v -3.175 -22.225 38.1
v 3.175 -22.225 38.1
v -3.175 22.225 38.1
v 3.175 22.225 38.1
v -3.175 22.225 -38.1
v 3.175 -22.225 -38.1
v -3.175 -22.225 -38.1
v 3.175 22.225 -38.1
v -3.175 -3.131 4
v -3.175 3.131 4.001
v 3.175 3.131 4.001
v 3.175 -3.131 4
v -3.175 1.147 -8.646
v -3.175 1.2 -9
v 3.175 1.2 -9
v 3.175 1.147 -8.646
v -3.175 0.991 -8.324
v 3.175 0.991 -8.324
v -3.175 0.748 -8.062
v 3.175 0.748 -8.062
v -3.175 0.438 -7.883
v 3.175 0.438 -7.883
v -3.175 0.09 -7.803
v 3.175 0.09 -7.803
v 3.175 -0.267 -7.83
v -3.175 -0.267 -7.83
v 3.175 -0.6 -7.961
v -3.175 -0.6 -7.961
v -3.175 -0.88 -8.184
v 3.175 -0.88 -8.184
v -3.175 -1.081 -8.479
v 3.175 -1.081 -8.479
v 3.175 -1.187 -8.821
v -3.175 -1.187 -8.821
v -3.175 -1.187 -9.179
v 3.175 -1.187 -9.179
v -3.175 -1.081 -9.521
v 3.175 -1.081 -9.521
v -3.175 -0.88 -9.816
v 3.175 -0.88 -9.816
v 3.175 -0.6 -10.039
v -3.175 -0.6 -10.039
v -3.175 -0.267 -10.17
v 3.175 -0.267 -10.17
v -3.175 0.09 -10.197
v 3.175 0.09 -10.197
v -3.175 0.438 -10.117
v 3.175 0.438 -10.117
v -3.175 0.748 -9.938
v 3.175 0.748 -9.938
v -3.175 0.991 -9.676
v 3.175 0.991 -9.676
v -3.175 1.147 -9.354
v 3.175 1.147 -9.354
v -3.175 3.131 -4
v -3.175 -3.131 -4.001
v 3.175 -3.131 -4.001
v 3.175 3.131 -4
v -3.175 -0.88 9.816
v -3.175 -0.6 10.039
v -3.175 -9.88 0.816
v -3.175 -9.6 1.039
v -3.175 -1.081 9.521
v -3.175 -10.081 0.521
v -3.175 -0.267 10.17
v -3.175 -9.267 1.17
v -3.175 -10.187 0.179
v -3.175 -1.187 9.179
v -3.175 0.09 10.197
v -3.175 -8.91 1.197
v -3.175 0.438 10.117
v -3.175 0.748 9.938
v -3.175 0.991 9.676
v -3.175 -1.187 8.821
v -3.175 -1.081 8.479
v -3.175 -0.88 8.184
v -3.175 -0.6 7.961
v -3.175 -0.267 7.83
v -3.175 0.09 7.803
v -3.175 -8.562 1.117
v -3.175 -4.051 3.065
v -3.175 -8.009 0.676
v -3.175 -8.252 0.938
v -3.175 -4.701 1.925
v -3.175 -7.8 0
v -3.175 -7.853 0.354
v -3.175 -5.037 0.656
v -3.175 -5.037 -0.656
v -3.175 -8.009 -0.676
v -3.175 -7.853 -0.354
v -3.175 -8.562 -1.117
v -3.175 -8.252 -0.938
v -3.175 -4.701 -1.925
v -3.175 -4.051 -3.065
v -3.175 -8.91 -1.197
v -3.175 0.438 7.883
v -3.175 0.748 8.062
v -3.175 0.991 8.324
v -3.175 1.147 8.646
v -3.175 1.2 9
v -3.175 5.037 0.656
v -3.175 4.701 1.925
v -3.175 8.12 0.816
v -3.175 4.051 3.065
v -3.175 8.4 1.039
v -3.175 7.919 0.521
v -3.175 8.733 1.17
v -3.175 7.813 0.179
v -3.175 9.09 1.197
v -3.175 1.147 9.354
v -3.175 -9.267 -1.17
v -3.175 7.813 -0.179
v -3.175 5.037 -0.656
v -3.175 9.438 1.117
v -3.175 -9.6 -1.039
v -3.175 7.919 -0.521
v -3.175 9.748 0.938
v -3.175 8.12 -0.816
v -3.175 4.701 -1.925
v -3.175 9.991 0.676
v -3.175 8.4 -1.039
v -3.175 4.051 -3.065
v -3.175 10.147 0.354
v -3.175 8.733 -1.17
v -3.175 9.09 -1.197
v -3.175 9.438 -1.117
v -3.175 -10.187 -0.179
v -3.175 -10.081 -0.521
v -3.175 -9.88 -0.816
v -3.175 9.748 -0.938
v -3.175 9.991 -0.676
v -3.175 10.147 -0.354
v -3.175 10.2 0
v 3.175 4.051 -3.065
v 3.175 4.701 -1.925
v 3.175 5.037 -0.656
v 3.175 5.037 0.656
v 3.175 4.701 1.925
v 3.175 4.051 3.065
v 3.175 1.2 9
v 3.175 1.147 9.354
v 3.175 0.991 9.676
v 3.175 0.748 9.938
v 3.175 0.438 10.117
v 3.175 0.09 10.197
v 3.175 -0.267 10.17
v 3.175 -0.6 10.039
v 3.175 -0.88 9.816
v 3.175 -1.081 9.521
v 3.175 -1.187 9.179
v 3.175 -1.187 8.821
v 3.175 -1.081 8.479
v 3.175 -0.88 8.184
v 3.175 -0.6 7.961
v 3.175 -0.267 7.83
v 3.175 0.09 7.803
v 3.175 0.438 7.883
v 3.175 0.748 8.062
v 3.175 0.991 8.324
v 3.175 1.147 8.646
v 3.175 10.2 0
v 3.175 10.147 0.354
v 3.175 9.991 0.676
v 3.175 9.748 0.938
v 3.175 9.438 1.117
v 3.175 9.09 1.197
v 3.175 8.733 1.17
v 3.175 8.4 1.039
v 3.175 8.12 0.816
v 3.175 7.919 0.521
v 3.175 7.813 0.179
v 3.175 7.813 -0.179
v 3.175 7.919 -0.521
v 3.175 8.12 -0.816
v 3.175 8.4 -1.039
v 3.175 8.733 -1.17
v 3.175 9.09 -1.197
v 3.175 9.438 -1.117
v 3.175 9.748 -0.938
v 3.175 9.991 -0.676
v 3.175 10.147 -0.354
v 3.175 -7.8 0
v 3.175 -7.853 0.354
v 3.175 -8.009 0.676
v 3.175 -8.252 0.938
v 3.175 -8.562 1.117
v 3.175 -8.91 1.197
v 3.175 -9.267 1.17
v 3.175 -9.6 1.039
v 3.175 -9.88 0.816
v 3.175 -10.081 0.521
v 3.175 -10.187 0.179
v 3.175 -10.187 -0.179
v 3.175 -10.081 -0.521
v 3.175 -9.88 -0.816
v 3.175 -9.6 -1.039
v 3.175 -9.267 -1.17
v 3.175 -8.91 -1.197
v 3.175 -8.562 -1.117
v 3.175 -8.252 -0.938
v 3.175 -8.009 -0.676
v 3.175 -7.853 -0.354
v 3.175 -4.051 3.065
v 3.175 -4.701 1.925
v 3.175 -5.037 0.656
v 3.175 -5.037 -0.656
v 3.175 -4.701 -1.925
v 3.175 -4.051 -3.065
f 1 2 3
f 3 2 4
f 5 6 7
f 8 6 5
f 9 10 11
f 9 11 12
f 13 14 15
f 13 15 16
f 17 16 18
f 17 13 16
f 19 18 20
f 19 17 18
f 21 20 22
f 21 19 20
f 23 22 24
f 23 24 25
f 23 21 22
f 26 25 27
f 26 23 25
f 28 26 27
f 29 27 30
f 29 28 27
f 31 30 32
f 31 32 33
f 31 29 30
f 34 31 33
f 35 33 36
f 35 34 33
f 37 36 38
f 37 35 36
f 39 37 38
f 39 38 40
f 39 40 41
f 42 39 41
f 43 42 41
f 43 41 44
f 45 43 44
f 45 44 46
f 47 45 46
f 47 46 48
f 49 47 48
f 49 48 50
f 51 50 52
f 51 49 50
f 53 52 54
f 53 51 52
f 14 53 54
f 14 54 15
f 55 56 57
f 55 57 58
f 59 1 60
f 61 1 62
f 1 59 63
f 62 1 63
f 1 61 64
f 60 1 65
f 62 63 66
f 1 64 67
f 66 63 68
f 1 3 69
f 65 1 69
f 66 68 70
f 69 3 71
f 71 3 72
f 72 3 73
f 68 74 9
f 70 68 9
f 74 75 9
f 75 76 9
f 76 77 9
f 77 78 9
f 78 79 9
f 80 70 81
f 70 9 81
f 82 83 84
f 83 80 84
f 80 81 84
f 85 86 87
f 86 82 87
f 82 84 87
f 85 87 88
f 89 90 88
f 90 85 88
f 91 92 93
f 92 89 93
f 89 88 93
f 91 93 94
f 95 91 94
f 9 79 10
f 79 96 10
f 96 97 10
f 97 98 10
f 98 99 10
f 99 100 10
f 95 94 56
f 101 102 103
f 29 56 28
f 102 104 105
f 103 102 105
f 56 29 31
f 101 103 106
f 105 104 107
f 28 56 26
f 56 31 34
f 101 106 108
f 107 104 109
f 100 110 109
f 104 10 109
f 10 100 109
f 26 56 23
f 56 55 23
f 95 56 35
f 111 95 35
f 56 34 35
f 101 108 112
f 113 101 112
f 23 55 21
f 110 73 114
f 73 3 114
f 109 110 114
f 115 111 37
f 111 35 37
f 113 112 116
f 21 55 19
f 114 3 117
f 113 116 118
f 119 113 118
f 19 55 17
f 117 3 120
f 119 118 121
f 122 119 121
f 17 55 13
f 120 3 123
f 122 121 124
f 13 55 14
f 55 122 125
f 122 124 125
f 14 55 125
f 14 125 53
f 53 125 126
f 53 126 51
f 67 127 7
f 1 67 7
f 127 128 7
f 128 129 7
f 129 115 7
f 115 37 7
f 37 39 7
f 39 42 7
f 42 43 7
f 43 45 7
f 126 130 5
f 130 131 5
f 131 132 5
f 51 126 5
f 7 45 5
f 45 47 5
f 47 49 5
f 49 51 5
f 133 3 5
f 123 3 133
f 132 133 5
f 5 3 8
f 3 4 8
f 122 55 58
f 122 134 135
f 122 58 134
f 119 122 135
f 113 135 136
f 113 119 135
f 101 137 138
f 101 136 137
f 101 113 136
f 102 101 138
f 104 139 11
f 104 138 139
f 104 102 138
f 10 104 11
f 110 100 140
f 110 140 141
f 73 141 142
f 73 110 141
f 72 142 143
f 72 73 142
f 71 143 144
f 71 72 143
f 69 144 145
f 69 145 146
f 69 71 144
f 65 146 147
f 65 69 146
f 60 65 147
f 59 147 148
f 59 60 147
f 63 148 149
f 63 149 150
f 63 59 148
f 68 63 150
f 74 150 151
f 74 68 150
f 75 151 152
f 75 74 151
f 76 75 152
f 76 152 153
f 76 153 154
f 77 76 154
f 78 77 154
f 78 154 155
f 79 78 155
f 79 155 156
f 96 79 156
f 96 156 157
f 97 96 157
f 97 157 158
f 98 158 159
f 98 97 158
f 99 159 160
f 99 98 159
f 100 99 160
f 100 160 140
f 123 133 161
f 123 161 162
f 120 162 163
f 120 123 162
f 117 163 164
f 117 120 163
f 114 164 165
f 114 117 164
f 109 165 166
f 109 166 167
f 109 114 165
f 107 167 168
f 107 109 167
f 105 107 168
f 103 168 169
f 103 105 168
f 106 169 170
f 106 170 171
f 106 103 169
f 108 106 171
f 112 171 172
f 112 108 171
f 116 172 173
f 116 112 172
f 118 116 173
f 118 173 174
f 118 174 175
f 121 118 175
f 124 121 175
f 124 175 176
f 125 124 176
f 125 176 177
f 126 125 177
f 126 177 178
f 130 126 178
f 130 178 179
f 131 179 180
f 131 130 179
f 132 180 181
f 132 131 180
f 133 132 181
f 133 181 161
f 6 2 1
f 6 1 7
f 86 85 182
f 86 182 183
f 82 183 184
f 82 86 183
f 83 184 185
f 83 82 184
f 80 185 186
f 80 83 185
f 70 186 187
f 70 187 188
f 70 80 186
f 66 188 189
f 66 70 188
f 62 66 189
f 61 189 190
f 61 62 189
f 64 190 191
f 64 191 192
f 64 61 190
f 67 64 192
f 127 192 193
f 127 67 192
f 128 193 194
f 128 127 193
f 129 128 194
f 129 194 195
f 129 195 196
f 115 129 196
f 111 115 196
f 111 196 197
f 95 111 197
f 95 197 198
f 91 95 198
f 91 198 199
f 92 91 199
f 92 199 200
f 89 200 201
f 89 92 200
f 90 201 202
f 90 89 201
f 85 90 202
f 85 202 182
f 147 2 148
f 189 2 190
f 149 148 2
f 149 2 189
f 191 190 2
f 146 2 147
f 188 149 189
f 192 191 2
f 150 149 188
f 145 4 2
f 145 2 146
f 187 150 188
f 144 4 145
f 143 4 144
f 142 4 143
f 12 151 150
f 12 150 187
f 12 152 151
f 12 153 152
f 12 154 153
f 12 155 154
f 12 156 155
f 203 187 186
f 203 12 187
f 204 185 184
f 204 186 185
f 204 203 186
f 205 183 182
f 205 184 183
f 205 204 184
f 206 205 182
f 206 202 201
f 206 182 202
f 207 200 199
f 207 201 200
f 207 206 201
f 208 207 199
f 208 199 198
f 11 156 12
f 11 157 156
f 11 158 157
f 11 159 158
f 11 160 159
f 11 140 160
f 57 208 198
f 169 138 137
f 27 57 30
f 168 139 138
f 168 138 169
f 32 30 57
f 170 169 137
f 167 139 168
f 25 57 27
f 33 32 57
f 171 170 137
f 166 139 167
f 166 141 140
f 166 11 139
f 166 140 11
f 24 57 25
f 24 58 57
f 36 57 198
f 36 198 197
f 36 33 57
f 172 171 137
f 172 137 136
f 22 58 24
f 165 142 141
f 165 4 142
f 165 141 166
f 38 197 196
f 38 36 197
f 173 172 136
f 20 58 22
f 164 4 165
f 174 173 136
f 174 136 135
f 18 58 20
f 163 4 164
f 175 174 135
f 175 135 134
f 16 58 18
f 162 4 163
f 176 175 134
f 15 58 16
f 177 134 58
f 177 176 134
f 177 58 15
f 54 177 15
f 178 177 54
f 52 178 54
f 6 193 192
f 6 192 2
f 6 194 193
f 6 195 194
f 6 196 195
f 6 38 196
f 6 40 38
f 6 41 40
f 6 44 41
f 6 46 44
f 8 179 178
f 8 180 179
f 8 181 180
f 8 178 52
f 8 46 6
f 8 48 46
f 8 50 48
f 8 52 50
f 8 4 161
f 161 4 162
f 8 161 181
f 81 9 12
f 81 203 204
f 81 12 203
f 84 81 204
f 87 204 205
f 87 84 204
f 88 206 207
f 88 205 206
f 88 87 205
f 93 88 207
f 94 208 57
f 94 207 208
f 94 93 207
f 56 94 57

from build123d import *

# Parameters (mm, degrees)
SKETCH1_W               = 76.2
SKETCH1_H               = 44.45
BOSS_EXTRUDE1_DEPTH     = 3.175
CUT_EXTRUDE1_DEPTH      = 45.563248591
CUT_EXTRUDE1_DEPTH_BACK = 45.563248591
ADVANCEDHOLE1_START     = -3.175
ADVANCEDHOLE1_OUTLINE_R = 1.2
ADVANCEDHOLE1_DEPTH     = 6.35


# Read off the part's stored shape, not the designer's step: AdvancedHole1
with BuildPart() as part:
    # Sketch1 → Boss-Extrude1 (new, symmetric)
    with BuildSketch(Plane(origin=(0, 0, 0), x_dir=(0, 0, -1), z_dir=(1, 0, 0))):
        Rectangle(SKETCH1_W, SKETCH1_H)
    extrude(amount=BOSS_EXTRUDE1_DEPTH, both=True)

    # Sketch2 → Cut-Extrude1 (cut, two sides: drawn at the far end of the back side and taken through both)
    with BuildSketch(Plane(origin=(3.175, 0, 0), x_dir=(0, 0, -1), z_dir=(1, 0, 0)).offset(-CUT_EXTRUDE1_DEPTH_BACK)):
        with BuildLine():
            ThreePointArc((4.0005, 3.130878431), (0, 5.08), (-4.0005, 3.130878431))
            Line((-4.0005, 3.130878431), (-4.0005, -3.130878431))
            ThreePointArc((-4.0005, -3.130878431), (0, -5.08), (4.0005, -3.130878431))
            Line((4.0005, -3.130878431), (4.0005, 3.130878431))
        make_face()
    extrude(amount=CUT_EXTRUDE1_DEPTH + CUT_EXTRUDE1_DEPTH_BACK, mode=Mode.SUBTRACT)

    # AdvancedHole1 outline → AdvancedHole1 (cut)
    with BuildSketch(Plane.YZ.offset(ADVANCEDHOLE1_START)):
        with Locations((-9, 0)):
            Circle(ADVANCEDHOLE1_OUTLINE_R)
        with Locations((0, 9)):
            Circle(ADVANCEDHOLE1_OUTLINE_R)
        with Locations((9, 0)):
            Circle(ADVANCEDHOLE1_OUTLINE_R)
        with Locations((0, -9)):
            Circle(ADVANCEDHOLE1_OUTLINE_R)
    extrude(amount=ADVANCEDHOLE1_DEPTH, mode=Mode.SUBTRACT)


solid = part.part
